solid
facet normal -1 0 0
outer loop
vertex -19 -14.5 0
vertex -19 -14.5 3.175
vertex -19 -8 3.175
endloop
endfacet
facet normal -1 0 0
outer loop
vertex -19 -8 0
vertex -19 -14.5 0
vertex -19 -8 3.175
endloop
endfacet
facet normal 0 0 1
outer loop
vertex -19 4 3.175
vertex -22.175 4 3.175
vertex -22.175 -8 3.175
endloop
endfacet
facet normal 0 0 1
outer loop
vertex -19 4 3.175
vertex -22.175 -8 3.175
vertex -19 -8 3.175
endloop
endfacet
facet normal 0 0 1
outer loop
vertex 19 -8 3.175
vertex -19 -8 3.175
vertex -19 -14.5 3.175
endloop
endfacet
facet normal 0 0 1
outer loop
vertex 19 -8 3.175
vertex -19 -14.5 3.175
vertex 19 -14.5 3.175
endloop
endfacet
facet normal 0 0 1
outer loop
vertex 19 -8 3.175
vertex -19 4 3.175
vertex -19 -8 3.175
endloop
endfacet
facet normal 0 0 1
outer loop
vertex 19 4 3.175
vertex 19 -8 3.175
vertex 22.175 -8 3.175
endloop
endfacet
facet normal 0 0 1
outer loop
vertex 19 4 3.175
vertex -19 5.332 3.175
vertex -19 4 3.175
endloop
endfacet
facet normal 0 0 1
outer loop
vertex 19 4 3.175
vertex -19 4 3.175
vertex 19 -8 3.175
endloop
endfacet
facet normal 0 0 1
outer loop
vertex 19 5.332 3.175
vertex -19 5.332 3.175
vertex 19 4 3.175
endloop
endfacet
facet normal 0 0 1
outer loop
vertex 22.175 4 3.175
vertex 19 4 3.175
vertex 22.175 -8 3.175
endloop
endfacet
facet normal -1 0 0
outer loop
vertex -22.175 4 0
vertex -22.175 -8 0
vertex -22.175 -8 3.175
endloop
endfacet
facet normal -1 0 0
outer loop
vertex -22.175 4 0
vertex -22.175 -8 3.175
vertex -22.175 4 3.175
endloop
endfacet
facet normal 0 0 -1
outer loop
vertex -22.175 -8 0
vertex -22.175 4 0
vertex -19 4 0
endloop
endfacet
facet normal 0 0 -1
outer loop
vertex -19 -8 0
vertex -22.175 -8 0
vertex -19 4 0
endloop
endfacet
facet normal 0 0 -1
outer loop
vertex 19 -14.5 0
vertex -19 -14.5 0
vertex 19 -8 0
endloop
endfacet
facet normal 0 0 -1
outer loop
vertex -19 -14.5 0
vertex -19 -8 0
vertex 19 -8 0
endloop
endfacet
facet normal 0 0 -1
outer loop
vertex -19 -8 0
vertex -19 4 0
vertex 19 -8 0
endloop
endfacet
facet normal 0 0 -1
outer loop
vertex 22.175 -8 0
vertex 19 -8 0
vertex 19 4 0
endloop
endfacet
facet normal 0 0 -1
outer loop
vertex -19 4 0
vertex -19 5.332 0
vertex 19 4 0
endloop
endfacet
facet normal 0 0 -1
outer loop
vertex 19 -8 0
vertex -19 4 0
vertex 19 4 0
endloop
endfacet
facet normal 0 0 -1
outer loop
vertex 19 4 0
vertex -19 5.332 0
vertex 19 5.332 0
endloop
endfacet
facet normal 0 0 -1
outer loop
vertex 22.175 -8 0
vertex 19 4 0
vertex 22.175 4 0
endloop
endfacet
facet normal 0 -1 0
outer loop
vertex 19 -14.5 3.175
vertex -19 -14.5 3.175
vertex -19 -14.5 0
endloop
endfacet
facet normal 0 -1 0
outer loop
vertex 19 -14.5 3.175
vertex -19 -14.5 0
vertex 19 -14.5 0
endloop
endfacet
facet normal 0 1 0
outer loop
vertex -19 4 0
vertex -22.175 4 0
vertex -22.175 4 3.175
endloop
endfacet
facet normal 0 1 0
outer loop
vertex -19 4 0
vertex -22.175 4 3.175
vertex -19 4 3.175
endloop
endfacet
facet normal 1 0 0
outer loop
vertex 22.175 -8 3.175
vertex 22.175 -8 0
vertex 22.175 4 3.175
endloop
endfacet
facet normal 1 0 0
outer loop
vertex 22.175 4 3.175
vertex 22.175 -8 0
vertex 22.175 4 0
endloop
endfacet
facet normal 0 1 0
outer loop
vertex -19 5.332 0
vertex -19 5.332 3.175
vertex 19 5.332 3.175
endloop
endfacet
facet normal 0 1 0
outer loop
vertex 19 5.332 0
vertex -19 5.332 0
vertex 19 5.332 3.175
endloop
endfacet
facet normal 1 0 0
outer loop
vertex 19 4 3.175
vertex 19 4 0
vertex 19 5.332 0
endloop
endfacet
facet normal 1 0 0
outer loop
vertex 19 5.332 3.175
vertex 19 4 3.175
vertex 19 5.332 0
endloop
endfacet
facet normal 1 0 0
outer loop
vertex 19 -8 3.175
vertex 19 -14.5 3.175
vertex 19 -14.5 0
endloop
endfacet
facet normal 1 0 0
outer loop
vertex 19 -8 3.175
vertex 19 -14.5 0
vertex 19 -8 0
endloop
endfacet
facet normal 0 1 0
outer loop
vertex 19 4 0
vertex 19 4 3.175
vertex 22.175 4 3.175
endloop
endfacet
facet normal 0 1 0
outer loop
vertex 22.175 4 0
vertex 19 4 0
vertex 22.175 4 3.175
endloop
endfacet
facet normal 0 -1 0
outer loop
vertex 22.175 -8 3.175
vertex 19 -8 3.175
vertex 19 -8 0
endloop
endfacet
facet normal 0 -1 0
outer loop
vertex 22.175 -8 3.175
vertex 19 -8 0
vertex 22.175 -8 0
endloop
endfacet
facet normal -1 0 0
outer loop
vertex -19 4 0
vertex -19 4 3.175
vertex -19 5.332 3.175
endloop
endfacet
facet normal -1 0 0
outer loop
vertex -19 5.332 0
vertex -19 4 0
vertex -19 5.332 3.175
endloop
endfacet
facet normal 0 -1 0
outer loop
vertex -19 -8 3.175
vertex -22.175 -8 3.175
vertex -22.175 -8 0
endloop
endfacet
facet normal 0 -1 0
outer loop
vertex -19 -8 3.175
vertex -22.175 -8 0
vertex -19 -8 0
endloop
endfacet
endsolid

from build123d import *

# Parameters (mm, degrees)
SKETCH1_W           = 3.175
SKETCH1_H           = 12
SKETCH1_H_2         = 18
BOSS_EXTRUDE1_DEPTH = 3.175
SKETCH2_W           = 32.65
SKETCH2_H           = 2
BOSS_EXTRUDE2_DEPTH = 3.175
SKETCH3_W           = 3.175
SKETCH3_H           = 1.331730769
CUT_EXTRUDE2_DEPTH  = 10
SKETCH5_W           = 5.35
SKETCH5_H           = 2
BOSS_EXTRUDE5_DEPTH = 3.175


with BuildPart() as part:
    # Sketch1 → Boss-Extrude1 (new body)
    with BuildSketch(Plane.XY):
        Polygon((19, 5.331730769), (-19, 12.5), (-19, 10), (-19, -8), (-19, -12.5), (19, -12.5), (19, -8), (19, 4), align=None)
        with Locations((20.5875, -2)):
            Rectangle(SKETCH1_W, SKETCH1_H)
        with Locations((-20.5875, 1)):
            Rectangle(SKETCH1_W, SKETCH1_H_2)
    extrude(amount=BOSS_EXTRUDE1_DEPTH)

    # Sketch2 → Boss-Extrude2 (add)
    with BuildSketch(Plane.XY.offset(3.175)):
        with Locations((2.675, -13.5)):
            Rectangle(SKETCH2_W, SKETCH2_H)
    extrude(amount=-BOSS_EXTRUDE2_DEPTH)

    # Sketch3 → Cut-Extrude2 (cut)
    with BuildSketch(Plane.XY.offset(3.175)):
        with Locations((-20.5875, 4.665865384)):
            Rectangle(SKETCH3_W, SKETCH3_H)
        Polygon((-19, 5.331730769), (-19, 9.853630911), (-19, 10), (-22.175, 10), (-22.175, 5.331730769), align=None)
        Polygon((-19, 10), (-19, 9.853630911), (-19, 5.331730769), (19, 5.331730769), (-11.823223146, 11.146182403), (-19, 11.146182403), align=None)
        Polygon((-19, 12.5), (-19, 11.146182403), (-11.823223146, 11.146182403), align=None)
    extrude(amount=-CUT_EXTRUDE2_DEPTH, mode=Mode.SUBTRACT)

    # Sketch5 → Boss-Extrude5 (add)
    with BuildSketch(Plane.XY.offset(3.175)):
        with Locations((-16.325, -13.5)):
            Rectangle(SKETCH5_W, SKETCH5_H)
    extrude(amount=-BOSS_EXTRUDE5_DEPTH)


solid = part.part
